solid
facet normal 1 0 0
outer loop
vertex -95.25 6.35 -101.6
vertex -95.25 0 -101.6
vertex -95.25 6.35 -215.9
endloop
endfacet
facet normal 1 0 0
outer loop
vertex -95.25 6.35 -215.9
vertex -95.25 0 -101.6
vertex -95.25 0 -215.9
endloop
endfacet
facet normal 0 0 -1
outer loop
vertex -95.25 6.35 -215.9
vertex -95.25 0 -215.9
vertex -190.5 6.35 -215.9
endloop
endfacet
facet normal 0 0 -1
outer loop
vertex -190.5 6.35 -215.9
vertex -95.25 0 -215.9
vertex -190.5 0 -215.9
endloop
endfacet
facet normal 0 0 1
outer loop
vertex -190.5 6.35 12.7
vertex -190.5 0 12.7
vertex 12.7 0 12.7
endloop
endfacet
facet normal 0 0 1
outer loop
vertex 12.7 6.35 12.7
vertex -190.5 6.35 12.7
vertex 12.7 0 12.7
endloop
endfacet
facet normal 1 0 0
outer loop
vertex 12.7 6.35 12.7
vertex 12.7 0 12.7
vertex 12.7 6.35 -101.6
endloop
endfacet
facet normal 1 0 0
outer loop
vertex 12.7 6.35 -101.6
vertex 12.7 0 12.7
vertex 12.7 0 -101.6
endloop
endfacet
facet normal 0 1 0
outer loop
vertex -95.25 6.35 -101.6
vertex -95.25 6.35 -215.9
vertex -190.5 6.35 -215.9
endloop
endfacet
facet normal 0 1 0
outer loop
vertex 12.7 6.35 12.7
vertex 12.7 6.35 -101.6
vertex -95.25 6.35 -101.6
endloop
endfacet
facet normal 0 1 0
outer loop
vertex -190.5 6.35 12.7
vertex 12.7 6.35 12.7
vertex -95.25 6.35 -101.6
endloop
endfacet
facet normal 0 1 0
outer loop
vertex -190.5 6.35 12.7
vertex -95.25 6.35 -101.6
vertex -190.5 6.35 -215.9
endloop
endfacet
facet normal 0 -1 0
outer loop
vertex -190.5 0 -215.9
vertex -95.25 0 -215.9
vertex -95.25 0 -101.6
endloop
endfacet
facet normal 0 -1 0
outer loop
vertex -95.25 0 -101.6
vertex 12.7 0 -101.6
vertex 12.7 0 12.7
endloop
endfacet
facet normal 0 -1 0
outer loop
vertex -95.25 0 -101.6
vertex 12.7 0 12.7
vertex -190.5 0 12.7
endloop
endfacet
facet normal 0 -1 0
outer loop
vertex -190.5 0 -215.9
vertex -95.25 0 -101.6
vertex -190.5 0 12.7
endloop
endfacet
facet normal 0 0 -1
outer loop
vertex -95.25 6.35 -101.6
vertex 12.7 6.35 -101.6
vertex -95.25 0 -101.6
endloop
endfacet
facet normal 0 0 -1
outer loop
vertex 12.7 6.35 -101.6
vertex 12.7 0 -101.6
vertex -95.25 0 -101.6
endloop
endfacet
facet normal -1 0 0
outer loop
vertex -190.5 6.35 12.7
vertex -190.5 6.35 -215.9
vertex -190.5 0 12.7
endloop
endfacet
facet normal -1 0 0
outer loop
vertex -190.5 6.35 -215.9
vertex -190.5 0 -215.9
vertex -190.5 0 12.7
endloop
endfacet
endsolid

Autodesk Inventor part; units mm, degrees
ref_plane "YZ Plane" through (0, 0, 0) normal (1, 0, 0) x (0, 1, 0)
ref_plane "XZ Plane" through (0, 0, 0) normal (0, 1, 0) x (-1, 0, 0)
ref_plane "XY Plane" through (0, 0, 0) normal (0, 0, 1) x (1, 0, 0)
sketch "Sketch1" plane through (0, 0, 0) normal (0, 1, 0) x (-1, 0, 0)
  point P0 (0, 0)
sketch "Sketch2" plane through (0, 0, 0) normal (0, 1, 0) x (-1, 0, 0)
  line L0 (0, 0) -> (177.8, 0)
  line L1 (177.8, 0) -> (177.8, -203.2)
  line L2 (0, 0) -> (0, -88.9)
  line L3 (177.8, -203.2) -> (107.95, -203.2)
  line L4 (107.95, -203.2) -> (107.95, -88.9)
  line L5 (0, -88.9) -> (107.95, -88.9)
  line L6 (190.5, -215.9) -> (190.5, 12.7)
  line L7 (190.5, 12.7) -> (-12.7, 12.7)
  line L8 (-12.7, 12.7) -> (-12.7, -101.6)
  line L9 (-12.7, -101.6) -> (95.25, -101.6)
  line L10 (95.25, -101.6) -> (95.25, -215.9)
  line L11 (95.25, -215.9) -> (190.5, -215.9)
  dimension "d0" = 203.2
  dimension "d1" = 177.8
  dimension "d2" = 88.9
  dimension "d3" = 69.85
  dimension "d4" = 12.7
extrude "Extrusion1" add sketch "Sketch2" along normal blind 6.35 contours L0 L1 L3 L4 L5 L2 | L11 L10 L9 L8 L7 L6
properties part number "RSX top" material "Aluminum 6061"
